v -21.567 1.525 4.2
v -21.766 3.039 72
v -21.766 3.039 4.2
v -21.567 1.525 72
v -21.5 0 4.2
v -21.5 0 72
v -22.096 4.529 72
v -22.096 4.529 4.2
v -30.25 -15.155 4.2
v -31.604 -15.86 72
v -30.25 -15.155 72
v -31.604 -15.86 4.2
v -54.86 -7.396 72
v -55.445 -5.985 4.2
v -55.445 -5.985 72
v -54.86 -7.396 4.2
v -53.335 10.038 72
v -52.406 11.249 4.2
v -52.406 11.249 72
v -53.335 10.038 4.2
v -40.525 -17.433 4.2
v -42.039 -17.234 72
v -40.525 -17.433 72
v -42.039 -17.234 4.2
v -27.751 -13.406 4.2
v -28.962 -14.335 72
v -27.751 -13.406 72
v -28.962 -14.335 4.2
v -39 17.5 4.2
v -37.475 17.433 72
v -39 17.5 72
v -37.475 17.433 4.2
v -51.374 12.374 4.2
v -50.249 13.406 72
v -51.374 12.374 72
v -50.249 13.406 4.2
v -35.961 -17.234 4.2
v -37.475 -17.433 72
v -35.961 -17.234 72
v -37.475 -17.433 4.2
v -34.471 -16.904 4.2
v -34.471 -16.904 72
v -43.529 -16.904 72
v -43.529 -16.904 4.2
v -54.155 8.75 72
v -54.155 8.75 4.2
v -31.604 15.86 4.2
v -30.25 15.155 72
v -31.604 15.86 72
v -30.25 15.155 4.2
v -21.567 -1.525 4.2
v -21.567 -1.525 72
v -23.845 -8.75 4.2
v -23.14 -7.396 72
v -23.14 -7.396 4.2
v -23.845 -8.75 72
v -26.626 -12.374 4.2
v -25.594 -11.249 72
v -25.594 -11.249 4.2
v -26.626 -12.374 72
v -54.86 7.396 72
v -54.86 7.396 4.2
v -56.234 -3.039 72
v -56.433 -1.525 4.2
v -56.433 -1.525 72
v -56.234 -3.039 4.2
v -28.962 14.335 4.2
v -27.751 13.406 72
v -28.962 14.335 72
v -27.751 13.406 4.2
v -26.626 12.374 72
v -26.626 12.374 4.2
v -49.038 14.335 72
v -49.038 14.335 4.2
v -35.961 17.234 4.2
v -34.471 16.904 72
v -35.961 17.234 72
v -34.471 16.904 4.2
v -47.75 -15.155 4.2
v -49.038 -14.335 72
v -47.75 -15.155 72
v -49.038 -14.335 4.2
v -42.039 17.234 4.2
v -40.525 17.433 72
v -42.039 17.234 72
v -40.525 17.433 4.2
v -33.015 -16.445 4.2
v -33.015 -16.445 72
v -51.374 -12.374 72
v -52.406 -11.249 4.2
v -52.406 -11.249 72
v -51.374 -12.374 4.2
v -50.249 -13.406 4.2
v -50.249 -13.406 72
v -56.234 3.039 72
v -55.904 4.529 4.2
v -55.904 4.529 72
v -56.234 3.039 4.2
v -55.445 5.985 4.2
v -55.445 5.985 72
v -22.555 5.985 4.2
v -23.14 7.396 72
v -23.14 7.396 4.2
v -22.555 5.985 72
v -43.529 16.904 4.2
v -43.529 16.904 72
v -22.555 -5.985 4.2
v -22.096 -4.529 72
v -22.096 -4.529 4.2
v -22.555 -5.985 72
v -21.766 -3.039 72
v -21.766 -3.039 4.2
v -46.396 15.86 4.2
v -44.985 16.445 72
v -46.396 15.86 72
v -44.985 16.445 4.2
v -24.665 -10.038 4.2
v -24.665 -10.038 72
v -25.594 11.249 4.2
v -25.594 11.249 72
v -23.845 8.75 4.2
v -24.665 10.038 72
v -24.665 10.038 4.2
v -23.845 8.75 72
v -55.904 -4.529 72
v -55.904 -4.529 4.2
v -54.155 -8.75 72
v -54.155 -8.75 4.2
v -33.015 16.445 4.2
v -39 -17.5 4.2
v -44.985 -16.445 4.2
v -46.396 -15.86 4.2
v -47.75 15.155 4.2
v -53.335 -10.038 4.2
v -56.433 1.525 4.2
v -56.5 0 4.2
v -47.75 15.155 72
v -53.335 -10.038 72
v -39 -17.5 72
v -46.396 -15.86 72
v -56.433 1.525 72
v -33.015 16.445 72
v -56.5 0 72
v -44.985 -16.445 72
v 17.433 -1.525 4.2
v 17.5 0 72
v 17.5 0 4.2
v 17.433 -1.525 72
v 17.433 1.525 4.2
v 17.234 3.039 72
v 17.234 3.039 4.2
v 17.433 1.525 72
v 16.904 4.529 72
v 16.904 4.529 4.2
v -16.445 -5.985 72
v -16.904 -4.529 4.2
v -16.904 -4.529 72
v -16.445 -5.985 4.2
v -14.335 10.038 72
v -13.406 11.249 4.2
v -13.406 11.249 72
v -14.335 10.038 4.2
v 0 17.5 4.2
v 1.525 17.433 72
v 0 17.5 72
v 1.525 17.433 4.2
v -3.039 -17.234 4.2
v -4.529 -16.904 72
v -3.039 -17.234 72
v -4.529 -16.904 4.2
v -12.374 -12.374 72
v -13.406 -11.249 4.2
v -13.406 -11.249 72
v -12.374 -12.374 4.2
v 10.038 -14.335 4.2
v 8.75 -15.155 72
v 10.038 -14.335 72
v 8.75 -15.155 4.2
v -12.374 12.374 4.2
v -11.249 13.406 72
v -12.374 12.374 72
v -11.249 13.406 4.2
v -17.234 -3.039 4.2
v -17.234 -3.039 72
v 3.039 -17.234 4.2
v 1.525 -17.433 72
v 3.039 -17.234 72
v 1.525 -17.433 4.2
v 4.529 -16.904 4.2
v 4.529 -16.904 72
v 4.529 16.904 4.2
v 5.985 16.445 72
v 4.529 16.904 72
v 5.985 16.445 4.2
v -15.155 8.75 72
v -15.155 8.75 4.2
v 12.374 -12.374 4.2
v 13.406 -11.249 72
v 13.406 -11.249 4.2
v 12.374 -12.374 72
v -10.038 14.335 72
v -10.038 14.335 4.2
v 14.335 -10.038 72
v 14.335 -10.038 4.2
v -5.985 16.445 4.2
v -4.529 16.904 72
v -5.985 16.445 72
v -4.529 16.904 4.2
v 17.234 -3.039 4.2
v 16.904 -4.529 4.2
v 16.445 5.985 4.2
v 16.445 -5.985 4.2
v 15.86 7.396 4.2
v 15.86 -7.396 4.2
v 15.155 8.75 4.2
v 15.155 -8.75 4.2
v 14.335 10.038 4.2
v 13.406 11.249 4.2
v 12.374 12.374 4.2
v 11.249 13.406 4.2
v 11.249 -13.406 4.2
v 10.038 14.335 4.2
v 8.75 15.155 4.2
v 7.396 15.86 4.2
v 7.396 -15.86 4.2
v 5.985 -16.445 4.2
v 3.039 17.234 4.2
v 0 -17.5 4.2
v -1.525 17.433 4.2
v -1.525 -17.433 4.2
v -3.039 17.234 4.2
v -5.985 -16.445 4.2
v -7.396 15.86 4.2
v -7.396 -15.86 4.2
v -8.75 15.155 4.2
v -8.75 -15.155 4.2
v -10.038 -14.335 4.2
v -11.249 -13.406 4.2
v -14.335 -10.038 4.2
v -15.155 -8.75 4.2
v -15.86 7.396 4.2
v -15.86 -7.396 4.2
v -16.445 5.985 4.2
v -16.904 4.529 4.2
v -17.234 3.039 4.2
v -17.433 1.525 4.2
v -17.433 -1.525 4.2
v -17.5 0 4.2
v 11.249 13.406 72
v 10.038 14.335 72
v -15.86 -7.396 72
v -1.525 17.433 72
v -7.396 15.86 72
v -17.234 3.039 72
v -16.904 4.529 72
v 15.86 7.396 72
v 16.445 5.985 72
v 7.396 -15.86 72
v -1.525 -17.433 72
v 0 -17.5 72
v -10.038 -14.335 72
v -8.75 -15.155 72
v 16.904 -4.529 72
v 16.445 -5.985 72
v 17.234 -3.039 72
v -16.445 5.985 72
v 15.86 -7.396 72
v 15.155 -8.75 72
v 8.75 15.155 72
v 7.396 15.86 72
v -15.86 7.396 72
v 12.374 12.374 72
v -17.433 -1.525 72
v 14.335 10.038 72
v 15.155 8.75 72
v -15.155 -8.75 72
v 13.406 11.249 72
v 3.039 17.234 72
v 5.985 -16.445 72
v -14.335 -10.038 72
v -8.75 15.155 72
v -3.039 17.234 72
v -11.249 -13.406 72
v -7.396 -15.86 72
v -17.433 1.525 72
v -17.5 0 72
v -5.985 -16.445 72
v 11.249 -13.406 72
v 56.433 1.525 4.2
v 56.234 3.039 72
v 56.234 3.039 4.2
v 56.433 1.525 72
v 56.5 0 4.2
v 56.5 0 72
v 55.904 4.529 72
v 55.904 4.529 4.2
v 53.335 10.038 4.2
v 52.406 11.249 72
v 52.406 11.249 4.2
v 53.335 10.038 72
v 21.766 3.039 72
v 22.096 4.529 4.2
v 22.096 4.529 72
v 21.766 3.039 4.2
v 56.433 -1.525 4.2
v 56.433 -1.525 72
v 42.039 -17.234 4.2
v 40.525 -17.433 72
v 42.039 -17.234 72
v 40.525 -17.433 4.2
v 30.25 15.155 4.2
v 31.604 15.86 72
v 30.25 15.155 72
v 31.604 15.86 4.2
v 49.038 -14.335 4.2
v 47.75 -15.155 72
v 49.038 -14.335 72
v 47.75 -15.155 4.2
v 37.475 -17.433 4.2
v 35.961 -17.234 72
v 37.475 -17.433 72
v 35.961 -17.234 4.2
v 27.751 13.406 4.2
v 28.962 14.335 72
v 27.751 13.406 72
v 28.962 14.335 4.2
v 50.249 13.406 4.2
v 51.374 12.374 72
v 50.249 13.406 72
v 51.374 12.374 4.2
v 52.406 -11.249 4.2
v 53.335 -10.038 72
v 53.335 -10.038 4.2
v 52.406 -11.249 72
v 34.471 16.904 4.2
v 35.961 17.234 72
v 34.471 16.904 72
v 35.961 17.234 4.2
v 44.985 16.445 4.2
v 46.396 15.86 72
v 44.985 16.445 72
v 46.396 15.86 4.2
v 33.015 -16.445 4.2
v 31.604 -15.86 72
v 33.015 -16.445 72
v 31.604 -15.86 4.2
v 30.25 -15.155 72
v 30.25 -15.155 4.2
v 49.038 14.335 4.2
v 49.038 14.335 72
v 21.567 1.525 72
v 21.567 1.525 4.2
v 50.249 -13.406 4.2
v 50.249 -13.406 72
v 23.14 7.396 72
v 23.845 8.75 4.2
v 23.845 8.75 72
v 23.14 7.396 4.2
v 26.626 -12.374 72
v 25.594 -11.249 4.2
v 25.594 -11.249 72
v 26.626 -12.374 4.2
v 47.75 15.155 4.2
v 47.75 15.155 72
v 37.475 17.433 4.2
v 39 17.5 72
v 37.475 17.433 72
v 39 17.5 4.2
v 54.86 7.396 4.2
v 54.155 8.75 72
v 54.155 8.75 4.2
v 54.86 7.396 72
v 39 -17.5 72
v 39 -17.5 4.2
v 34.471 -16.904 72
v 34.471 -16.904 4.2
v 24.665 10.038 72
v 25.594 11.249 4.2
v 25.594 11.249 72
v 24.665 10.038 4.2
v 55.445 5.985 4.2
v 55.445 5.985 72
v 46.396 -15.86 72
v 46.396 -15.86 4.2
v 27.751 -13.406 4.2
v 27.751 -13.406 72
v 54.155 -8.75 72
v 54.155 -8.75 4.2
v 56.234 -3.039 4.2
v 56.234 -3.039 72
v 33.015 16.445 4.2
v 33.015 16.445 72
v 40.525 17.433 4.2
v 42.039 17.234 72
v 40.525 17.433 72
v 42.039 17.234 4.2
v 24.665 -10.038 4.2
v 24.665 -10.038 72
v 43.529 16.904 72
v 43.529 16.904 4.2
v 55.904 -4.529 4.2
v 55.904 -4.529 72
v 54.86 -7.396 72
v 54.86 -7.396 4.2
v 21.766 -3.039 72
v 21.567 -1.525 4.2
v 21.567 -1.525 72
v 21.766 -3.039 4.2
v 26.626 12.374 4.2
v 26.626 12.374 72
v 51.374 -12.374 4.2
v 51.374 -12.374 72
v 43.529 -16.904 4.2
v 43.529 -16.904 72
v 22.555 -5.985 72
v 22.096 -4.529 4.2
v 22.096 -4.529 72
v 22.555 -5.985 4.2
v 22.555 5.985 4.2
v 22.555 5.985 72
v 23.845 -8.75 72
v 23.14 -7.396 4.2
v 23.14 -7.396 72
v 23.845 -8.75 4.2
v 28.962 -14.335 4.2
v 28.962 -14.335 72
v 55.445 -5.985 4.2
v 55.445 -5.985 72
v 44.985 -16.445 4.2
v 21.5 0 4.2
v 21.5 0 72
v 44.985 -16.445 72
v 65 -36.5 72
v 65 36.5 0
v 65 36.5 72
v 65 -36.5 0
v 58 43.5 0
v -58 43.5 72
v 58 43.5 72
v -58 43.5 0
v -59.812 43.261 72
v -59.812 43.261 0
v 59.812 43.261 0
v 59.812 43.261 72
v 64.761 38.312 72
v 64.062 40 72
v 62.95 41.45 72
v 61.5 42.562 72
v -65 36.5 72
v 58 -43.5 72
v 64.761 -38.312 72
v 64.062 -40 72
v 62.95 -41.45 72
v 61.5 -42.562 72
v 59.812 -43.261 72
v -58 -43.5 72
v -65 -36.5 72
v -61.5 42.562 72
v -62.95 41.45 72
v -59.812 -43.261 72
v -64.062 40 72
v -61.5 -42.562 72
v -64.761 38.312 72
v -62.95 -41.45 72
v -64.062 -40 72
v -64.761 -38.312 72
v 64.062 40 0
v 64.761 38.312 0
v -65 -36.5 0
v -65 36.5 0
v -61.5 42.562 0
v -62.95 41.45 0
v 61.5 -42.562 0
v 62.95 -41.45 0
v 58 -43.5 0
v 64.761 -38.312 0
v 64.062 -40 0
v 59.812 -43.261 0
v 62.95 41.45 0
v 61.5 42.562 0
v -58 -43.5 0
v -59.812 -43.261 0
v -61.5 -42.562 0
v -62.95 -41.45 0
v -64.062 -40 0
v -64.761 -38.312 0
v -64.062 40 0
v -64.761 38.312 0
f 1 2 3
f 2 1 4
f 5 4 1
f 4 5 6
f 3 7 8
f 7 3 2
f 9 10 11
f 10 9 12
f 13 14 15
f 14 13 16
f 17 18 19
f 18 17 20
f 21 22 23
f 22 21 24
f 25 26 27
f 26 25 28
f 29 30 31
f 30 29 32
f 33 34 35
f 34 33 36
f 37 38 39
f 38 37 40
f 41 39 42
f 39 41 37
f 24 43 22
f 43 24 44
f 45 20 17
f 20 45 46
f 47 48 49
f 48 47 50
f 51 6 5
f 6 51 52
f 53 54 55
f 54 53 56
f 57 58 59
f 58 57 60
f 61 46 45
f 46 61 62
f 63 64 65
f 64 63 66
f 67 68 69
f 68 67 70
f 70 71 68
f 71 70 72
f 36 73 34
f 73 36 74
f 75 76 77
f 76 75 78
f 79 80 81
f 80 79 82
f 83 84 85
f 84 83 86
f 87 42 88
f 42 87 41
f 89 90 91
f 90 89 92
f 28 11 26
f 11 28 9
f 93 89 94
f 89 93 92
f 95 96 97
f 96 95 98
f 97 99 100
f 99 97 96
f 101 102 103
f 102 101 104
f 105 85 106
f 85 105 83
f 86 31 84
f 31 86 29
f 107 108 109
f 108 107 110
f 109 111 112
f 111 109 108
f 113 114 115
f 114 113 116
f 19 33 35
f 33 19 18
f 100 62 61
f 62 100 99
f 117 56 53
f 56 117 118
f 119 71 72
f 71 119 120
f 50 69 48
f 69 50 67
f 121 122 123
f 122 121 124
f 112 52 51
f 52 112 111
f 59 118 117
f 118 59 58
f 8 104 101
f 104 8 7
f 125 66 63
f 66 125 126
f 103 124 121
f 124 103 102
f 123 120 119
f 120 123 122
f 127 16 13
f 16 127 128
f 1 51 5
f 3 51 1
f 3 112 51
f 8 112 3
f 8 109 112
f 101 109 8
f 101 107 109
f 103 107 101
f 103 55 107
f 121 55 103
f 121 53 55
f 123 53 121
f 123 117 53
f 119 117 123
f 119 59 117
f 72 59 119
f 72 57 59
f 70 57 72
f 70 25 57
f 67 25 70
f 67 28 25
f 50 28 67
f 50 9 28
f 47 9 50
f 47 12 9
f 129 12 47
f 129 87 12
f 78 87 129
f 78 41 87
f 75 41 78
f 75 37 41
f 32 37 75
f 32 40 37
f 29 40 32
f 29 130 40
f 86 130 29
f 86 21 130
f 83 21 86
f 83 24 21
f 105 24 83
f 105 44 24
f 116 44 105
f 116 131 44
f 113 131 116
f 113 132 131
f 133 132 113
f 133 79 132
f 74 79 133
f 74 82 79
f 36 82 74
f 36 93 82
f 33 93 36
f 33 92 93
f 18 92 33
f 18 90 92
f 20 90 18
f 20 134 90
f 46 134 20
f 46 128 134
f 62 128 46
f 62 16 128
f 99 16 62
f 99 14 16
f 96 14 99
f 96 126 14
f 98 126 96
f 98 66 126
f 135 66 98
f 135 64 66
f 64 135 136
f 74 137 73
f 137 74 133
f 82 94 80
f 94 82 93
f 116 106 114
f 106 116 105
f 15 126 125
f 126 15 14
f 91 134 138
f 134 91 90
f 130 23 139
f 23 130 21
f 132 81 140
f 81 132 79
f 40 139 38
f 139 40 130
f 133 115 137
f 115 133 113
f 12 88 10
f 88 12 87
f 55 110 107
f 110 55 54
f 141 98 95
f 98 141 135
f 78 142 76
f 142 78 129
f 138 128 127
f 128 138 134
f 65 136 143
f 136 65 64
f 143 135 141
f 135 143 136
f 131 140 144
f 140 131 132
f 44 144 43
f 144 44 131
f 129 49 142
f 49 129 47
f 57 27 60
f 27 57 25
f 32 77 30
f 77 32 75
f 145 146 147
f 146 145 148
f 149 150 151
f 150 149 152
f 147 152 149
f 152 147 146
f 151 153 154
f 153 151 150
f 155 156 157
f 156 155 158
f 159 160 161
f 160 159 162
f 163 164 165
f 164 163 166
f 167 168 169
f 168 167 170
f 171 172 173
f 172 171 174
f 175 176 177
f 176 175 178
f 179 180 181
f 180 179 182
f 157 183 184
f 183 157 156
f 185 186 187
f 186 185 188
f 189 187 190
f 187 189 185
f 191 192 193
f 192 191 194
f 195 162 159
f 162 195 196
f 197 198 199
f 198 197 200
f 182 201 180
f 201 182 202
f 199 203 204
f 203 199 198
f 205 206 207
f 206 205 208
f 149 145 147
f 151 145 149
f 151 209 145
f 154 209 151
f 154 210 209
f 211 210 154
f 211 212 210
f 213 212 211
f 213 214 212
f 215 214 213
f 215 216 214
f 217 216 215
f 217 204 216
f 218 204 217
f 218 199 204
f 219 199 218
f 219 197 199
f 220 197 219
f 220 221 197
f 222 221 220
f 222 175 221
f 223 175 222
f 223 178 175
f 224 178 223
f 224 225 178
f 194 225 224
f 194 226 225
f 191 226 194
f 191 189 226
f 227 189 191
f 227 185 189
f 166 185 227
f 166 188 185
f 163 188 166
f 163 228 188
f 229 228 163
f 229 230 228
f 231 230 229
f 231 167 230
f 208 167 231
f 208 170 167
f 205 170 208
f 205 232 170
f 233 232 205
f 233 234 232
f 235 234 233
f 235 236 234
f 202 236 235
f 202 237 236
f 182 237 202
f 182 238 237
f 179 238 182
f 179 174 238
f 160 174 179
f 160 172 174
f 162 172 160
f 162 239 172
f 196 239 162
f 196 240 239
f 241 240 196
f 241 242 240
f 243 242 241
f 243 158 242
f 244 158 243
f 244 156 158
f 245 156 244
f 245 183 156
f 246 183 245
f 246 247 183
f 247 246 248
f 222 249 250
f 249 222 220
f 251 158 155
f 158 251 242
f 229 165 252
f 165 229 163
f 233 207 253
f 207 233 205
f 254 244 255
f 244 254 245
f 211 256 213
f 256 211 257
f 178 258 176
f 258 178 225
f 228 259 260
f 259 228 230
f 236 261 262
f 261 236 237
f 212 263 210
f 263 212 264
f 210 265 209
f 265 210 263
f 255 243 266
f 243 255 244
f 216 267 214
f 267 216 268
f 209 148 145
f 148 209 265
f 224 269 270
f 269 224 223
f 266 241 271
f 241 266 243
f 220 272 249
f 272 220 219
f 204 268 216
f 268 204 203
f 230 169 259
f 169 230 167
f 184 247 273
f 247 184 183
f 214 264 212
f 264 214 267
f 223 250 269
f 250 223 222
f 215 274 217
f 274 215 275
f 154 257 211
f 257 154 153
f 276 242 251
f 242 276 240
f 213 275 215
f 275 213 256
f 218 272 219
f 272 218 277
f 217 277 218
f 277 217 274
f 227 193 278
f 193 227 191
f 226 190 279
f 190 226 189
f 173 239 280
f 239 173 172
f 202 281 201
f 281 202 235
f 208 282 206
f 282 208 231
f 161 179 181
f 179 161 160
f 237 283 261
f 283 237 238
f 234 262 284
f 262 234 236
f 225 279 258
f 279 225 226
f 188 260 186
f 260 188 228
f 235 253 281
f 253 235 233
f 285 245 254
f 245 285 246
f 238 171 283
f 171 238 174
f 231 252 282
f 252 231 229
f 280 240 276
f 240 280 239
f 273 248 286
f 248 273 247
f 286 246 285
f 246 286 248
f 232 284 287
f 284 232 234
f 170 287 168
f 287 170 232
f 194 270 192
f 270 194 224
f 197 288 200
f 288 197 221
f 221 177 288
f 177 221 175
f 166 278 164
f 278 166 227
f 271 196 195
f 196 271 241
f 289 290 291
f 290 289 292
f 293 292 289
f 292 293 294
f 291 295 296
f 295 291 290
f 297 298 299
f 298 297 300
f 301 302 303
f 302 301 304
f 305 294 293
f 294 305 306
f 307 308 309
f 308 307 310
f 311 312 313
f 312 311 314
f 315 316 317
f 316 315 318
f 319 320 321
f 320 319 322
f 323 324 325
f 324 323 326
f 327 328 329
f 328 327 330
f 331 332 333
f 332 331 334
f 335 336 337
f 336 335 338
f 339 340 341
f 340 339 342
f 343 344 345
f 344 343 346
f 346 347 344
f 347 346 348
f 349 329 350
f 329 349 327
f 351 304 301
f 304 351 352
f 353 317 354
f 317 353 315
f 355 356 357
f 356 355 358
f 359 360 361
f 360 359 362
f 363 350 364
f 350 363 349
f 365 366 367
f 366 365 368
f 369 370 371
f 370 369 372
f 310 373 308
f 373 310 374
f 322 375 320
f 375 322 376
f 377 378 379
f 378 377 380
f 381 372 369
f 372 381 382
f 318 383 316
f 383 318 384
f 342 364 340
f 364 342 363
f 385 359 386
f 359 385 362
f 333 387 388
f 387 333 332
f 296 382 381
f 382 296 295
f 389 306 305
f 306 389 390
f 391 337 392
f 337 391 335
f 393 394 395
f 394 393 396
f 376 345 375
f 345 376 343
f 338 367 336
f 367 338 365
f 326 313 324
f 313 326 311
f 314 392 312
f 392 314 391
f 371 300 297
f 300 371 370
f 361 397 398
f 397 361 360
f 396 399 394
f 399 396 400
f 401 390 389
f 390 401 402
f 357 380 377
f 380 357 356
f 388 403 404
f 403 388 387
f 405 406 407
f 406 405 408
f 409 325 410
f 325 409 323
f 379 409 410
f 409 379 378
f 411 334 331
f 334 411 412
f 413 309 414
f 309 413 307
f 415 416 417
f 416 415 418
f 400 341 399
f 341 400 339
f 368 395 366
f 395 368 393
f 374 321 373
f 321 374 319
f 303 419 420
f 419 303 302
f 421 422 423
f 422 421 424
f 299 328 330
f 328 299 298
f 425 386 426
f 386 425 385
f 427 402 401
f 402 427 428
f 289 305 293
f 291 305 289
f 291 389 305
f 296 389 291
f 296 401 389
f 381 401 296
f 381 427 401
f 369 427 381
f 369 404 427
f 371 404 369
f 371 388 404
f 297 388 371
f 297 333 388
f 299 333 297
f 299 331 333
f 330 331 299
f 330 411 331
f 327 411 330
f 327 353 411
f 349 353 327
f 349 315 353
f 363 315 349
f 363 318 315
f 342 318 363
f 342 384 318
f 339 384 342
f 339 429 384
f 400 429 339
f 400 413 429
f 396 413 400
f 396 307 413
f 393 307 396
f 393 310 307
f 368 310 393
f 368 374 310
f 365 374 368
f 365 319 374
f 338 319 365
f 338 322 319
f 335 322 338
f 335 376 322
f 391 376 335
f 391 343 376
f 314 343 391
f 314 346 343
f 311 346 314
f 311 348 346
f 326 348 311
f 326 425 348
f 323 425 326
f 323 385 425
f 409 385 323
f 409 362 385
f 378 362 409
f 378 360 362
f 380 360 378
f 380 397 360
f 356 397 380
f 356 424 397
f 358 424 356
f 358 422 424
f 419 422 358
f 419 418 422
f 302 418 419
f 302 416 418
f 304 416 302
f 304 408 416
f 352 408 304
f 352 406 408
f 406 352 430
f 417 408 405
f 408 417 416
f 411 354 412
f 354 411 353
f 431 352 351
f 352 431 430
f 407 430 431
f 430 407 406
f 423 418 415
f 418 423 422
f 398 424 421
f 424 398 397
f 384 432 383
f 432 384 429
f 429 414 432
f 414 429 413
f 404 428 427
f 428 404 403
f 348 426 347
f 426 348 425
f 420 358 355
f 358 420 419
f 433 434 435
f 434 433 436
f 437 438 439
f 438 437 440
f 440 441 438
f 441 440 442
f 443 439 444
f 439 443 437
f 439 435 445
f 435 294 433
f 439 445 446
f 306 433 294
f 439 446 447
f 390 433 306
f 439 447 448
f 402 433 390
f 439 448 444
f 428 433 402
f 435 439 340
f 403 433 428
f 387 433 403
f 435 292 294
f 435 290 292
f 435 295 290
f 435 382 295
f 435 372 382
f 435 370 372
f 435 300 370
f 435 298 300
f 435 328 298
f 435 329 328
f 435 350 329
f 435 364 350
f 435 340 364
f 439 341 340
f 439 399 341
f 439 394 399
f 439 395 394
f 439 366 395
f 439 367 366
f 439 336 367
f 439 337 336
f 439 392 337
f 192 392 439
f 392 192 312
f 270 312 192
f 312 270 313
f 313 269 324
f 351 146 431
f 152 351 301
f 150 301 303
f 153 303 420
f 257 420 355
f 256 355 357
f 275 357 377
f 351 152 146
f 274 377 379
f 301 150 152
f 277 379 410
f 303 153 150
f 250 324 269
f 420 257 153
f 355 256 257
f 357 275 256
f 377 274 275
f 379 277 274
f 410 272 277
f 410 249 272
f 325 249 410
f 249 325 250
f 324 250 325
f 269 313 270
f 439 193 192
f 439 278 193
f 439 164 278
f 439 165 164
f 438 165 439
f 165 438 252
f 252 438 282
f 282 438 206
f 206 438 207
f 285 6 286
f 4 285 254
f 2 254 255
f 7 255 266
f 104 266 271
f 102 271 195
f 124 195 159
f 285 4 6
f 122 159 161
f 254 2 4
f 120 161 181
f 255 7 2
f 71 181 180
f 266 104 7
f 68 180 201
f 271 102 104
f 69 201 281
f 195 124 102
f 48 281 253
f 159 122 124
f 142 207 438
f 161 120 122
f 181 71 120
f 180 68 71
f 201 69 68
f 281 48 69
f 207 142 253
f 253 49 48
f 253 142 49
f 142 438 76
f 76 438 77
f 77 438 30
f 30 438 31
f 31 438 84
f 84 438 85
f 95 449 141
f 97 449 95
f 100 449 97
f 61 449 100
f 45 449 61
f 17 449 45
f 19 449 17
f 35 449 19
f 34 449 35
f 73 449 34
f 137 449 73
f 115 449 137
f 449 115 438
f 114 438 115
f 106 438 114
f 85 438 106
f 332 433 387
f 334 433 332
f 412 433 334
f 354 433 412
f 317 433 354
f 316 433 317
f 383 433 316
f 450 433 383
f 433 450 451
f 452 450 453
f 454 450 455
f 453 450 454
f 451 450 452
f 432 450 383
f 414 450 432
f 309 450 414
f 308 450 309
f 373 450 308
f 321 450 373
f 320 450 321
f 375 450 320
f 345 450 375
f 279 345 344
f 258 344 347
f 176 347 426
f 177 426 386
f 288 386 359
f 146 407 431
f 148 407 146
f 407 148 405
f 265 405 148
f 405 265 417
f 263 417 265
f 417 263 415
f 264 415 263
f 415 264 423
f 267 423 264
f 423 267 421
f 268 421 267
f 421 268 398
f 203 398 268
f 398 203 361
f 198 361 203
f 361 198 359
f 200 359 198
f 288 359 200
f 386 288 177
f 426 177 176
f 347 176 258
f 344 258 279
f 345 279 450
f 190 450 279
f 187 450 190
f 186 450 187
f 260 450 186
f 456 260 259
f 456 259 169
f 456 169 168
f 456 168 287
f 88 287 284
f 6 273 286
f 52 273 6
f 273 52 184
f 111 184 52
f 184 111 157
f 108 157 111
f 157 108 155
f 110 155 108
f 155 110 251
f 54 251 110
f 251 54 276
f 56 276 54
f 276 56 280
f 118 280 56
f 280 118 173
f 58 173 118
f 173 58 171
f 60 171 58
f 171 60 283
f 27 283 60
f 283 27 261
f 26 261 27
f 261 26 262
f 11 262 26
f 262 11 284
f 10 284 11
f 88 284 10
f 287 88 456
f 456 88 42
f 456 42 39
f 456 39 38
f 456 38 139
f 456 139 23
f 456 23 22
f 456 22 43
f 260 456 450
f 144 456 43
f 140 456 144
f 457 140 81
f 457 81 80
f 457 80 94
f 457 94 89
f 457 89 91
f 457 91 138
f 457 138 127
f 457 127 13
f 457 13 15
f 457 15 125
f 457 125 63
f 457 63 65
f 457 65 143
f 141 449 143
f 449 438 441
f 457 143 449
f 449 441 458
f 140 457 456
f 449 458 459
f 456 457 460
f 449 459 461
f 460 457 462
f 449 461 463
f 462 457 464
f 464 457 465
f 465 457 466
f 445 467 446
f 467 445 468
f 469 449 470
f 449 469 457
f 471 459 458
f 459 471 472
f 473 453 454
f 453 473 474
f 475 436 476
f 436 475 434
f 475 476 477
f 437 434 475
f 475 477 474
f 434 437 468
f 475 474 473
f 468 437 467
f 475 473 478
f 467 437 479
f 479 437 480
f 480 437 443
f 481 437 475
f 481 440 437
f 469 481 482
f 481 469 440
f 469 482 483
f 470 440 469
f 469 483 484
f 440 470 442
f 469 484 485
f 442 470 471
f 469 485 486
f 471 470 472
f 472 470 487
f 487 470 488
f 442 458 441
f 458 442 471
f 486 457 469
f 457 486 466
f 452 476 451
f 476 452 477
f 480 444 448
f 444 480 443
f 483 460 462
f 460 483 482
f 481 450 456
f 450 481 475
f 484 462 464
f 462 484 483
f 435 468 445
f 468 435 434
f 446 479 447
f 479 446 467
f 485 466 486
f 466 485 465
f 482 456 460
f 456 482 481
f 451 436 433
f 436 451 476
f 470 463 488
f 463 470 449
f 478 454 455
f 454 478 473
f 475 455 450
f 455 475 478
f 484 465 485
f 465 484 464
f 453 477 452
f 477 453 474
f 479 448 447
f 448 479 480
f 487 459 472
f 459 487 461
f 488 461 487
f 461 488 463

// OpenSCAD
// SPDX-License-Identifier: MIT
// Modular Pencil Caddy | Refined batch 01 | OpenSCAD mm/Z-up.
// Prototype: slicer, fit, material, stability and safety remain UNVERIFIED.
use <lib/commerce_forms.scad> // v1.3 compatibility; other SKUs retain their original template.
use <lib/refined_forms.scad>
width_mm = 130;
depth_mm = 87;
height_mm = 72;
refined_form(slug="modular-pencil-caddy", family="organizer", variant=1, w=width_mm, d=depth_mm, h=height_mm);
